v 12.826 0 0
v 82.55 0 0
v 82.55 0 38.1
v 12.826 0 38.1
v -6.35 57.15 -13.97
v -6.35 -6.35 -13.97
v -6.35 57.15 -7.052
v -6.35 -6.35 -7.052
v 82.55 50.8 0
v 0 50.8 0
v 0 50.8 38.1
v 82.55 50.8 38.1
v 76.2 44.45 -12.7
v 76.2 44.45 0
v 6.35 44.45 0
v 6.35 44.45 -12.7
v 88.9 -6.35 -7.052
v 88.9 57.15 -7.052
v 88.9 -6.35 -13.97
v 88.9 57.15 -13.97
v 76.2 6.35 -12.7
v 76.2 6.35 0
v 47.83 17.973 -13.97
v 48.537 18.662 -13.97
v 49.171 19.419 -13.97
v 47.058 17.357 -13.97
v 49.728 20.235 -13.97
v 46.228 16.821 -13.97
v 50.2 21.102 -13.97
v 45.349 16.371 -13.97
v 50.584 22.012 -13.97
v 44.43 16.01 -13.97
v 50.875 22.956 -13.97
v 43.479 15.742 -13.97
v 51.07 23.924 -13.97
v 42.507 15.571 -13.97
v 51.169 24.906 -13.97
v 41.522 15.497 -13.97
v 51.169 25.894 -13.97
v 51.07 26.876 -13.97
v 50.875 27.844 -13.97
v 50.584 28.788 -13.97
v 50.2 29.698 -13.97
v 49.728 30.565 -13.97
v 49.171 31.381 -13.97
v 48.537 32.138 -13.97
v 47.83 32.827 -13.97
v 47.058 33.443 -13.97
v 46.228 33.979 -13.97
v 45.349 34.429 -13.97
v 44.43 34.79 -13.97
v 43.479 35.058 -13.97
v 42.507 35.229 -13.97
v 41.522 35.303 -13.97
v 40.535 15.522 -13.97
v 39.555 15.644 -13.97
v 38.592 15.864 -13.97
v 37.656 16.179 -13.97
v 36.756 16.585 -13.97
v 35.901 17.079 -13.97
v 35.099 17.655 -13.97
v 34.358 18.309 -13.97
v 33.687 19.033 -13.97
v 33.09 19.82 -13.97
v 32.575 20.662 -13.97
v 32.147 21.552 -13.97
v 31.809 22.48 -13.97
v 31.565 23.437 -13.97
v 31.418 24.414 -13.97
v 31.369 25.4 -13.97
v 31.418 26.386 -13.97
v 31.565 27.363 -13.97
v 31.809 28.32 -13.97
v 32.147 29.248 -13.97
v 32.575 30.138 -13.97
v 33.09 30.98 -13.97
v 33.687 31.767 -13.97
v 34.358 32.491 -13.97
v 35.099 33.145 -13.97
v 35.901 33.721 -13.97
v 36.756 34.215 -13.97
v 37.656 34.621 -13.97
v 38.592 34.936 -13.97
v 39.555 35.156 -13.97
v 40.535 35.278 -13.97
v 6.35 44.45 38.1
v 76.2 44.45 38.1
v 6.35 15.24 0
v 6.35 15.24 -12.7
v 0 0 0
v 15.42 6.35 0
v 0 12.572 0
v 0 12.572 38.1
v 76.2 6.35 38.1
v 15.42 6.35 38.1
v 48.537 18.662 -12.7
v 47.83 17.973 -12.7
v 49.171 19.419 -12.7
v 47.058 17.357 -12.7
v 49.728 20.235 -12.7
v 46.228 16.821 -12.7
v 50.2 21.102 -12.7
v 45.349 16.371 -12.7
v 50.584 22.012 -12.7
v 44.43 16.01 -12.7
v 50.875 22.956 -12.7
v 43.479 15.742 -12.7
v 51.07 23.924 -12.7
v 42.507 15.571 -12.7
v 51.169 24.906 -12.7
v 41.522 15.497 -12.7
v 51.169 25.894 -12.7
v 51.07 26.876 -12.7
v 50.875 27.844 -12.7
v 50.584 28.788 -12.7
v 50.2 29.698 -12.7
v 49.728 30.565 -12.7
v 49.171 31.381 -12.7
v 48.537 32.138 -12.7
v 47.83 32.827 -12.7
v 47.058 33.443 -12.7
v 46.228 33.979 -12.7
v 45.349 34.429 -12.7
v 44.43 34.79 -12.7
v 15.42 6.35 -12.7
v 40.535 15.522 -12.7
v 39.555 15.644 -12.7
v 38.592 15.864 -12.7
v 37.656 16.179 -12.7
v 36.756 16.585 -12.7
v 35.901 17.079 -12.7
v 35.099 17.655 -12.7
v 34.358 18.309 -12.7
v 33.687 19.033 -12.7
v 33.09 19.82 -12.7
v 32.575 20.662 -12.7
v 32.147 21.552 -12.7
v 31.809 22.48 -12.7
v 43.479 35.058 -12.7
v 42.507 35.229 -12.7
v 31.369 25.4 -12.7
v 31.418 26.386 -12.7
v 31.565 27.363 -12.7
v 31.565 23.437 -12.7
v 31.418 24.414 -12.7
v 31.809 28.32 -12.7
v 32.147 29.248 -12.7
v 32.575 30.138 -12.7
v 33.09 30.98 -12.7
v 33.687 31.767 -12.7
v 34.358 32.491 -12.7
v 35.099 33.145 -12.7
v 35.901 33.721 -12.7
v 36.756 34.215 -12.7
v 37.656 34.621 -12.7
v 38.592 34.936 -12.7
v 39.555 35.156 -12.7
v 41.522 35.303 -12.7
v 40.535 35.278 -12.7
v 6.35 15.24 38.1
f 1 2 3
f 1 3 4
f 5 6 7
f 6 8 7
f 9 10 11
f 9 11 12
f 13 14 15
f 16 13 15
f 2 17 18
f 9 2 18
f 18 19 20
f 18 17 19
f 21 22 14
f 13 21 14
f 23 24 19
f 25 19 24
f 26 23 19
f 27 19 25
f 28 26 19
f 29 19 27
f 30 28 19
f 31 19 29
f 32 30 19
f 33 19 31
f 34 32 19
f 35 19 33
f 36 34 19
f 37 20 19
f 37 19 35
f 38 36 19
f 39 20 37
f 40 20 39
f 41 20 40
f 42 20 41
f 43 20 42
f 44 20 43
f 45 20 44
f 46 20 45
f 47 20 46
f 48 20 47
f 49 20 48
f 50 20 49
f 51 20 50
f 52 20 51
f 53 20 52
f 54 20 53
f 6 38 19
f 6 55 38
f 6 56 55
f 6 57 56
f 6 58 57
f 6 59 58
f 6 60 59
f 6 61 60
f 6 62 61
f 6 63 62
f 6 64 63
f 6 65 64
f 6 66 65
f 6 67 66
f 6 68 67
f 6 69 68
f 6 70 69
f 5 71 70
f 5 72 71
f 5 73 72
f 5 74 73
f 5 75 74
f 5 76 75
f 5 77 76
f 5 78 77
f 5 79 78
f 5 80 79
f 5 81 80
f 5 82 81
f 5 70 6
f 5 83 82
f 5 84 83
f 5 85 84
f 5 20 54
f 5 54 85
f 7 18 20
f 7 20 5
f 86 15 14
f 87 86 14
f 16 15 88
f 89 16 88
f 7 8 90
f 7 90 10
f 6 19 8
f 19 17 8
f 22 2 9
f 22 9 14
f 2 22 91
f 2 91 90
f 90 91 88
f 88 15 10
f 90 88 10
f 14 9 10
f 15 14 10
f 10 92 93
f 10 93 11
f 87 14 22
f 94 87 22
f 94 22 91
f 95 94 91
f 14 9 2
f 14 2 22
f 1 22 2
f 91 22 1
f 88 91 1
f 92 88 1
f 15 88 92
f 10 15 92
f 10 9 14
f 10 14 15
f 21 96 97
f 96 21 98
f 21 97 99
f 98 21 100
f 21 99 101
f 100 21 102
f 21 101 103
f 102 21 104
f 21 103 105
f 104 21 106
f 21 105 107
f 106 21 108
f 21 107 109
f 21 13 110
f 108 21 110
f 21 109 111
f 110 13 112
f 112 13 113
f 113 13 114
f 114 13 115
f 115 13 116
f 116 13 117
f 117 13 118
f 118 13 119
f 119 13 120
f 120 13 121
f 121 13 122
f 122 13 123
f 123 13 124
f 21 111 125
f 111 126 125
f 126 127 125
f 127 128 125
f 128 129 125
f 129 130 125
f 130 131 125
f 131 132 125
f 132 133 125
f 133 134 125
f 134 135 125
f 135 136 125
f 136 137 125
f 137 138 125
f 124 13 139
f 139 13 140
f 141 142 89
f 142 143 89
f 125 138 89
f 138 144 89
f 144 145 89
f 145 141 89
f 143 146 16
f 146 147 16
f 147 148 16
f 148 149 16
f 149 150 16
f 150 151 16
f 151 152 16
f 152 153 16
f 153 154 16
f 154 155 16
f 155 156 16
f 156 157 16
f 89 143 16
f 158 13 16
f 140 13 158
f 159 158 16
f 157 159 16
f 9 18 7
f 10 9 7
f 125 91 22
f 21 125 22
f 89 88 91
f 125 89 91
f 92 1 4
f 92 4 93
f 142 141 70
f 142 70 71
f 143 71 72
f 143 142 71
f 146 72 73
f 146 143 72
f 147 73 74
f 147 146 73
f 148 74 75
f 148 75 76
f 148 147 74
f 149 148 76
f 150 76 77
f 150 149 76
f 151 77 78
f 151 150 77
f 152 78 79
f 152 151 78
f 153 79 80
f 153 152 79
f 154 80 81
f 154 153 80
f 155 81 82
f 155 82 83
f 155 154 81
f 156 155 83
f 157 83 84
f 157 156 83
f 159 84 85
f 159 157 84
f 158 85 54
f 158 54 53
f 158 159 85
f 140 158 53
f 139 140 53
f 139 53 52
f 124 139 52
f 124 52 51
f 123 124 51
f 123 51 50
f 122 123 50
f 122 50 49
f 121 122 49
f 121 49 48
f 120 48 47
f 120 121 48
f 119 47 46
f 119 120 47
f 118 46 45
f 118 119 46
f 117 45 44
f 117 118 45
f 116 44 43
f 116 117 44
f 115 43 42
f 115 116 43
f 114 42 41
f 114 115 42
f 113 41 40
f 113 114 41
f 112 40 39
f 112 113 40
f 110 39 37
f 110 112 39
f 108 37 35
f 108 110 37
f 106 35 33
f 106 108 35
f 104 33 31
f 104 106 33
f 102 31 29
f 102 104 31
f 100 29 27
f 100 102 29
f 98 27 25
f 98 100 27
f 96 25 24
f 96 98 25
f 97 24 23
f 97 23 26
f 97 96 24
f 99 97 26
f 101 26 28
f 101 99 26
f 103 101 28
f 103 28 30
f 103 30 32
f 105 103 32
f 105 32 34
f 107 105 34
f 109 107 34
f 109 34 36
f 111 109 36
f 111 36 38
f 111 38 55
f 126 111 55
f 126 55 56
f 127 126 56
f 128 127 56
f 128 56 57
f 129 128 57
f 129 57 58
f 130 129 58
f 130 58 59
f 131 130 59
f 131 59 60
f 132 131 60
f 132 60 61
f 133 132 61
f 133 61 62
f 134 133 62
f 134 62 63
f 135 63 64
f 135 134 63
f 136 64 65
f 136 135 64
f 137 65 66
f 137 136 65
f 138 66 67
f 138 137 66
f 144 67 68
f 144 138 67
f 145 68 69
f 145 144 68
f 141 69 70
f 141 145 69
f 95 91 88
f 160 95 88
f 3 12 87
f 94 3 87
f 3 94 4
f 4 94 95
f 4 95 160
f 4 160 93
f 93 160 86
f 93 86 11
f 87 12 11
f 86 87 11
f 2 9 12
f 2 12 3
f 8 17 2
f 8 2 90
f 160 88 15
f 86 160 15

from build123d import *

# Parameters (mm, degrees)
BOSS_EXTRUDE1_DEPTH = 38.1
SKETCH2_W           = 95.25
SKETCH2_H           = 63.5
BOSS_EXTRUDE2_DEPTH = 12.7
CHAMFER1_SIZE       = 6.35
CHAMFER1_SIZE2      = 7.052389469
SKETCH3_W           = 95.25
SKETCH3_H           = 63.5
SKETCH3_R           = 9.906
BOSS_EXTRUDE3_DEPTH = 1.27


with BuildPart() as part:
    # Sketch1 → Boss-Extrude1 (new body)
    with BuildSketch(Plane.XY):
        Polygon((0, 50.8), (82.55, 50.8), (82.55, 0), (12.826481322, 0), (0, 12.57246644), align=None)
        Polygon((6.35, 44.45), (76.2, 44.45), (76.2, 6.35), (15.419614104, 6.35), (6.35, 15.24), align=None, mode=Mode.SUBTRACT)
    extrude(amount=BOSS_EXTRUDE1_DEPTH)


with BuildPart() as body_2:
    # Sketch2 → Boss-Extrude2 (new body)
    with BuildSketch(Plane(origin=(0, 0, 0), x_dir=(-1, 0, 0), z_dir=(0, 0, -1))):
        with Locations((-41.275, 25.4)):
            Rectangle(SKETCH2_W, SKETCH2_H)
        Polygon((-6.35, 44.45), (-6.35, 15.24), (-15.419614104, 6.35), (-76.2, 6.35), (-76.2, 44.45), align=None, mode=Mode.SUBTRACT)
    extrude(amount=BOSS_EXTRUDE2_DEPTH)

    # Chamfer1
    chamfer1_edges = [body_2.edges().sort_by_distance(p)[0] for p in [
        (-6.35, 25.4, 0),
        (41.275, -6.35, 0),
        (88.9, 25.4, 0),
        (41.275, 57.15, 0),
    ]]
    chamfer1_side = [body_2.faces().sort_by_distance(p)[0] for p in [
        (87.75523747, 25.4, 0),
    ]]
    chamfer(chamfer1_edges, length=CHAMFER1_SIZE, length2=CHAMFER1_SIZE2, reference=chamfer1_side[0])

    # Sketch3 → Boss-Extrude3 (add)
    with BuildSketch(Plane(origin=(0, 0, -12.7), x_dir=(-1, 0, 0), z_dir=(0, 0, -1))):
        with Locations((-41.275, 25.4)):
            Rectangle(SKETCH3_W, SKETCH3_H)
        with Locations((-41.275, 25.4)):
            Circle(SKETCH3_R, mode=Mode.SUBTRACT)
    extrude(amount=BOSS_EXTRUDE3_DEPTH)


solid = Compound([part.part, body_2.part])
